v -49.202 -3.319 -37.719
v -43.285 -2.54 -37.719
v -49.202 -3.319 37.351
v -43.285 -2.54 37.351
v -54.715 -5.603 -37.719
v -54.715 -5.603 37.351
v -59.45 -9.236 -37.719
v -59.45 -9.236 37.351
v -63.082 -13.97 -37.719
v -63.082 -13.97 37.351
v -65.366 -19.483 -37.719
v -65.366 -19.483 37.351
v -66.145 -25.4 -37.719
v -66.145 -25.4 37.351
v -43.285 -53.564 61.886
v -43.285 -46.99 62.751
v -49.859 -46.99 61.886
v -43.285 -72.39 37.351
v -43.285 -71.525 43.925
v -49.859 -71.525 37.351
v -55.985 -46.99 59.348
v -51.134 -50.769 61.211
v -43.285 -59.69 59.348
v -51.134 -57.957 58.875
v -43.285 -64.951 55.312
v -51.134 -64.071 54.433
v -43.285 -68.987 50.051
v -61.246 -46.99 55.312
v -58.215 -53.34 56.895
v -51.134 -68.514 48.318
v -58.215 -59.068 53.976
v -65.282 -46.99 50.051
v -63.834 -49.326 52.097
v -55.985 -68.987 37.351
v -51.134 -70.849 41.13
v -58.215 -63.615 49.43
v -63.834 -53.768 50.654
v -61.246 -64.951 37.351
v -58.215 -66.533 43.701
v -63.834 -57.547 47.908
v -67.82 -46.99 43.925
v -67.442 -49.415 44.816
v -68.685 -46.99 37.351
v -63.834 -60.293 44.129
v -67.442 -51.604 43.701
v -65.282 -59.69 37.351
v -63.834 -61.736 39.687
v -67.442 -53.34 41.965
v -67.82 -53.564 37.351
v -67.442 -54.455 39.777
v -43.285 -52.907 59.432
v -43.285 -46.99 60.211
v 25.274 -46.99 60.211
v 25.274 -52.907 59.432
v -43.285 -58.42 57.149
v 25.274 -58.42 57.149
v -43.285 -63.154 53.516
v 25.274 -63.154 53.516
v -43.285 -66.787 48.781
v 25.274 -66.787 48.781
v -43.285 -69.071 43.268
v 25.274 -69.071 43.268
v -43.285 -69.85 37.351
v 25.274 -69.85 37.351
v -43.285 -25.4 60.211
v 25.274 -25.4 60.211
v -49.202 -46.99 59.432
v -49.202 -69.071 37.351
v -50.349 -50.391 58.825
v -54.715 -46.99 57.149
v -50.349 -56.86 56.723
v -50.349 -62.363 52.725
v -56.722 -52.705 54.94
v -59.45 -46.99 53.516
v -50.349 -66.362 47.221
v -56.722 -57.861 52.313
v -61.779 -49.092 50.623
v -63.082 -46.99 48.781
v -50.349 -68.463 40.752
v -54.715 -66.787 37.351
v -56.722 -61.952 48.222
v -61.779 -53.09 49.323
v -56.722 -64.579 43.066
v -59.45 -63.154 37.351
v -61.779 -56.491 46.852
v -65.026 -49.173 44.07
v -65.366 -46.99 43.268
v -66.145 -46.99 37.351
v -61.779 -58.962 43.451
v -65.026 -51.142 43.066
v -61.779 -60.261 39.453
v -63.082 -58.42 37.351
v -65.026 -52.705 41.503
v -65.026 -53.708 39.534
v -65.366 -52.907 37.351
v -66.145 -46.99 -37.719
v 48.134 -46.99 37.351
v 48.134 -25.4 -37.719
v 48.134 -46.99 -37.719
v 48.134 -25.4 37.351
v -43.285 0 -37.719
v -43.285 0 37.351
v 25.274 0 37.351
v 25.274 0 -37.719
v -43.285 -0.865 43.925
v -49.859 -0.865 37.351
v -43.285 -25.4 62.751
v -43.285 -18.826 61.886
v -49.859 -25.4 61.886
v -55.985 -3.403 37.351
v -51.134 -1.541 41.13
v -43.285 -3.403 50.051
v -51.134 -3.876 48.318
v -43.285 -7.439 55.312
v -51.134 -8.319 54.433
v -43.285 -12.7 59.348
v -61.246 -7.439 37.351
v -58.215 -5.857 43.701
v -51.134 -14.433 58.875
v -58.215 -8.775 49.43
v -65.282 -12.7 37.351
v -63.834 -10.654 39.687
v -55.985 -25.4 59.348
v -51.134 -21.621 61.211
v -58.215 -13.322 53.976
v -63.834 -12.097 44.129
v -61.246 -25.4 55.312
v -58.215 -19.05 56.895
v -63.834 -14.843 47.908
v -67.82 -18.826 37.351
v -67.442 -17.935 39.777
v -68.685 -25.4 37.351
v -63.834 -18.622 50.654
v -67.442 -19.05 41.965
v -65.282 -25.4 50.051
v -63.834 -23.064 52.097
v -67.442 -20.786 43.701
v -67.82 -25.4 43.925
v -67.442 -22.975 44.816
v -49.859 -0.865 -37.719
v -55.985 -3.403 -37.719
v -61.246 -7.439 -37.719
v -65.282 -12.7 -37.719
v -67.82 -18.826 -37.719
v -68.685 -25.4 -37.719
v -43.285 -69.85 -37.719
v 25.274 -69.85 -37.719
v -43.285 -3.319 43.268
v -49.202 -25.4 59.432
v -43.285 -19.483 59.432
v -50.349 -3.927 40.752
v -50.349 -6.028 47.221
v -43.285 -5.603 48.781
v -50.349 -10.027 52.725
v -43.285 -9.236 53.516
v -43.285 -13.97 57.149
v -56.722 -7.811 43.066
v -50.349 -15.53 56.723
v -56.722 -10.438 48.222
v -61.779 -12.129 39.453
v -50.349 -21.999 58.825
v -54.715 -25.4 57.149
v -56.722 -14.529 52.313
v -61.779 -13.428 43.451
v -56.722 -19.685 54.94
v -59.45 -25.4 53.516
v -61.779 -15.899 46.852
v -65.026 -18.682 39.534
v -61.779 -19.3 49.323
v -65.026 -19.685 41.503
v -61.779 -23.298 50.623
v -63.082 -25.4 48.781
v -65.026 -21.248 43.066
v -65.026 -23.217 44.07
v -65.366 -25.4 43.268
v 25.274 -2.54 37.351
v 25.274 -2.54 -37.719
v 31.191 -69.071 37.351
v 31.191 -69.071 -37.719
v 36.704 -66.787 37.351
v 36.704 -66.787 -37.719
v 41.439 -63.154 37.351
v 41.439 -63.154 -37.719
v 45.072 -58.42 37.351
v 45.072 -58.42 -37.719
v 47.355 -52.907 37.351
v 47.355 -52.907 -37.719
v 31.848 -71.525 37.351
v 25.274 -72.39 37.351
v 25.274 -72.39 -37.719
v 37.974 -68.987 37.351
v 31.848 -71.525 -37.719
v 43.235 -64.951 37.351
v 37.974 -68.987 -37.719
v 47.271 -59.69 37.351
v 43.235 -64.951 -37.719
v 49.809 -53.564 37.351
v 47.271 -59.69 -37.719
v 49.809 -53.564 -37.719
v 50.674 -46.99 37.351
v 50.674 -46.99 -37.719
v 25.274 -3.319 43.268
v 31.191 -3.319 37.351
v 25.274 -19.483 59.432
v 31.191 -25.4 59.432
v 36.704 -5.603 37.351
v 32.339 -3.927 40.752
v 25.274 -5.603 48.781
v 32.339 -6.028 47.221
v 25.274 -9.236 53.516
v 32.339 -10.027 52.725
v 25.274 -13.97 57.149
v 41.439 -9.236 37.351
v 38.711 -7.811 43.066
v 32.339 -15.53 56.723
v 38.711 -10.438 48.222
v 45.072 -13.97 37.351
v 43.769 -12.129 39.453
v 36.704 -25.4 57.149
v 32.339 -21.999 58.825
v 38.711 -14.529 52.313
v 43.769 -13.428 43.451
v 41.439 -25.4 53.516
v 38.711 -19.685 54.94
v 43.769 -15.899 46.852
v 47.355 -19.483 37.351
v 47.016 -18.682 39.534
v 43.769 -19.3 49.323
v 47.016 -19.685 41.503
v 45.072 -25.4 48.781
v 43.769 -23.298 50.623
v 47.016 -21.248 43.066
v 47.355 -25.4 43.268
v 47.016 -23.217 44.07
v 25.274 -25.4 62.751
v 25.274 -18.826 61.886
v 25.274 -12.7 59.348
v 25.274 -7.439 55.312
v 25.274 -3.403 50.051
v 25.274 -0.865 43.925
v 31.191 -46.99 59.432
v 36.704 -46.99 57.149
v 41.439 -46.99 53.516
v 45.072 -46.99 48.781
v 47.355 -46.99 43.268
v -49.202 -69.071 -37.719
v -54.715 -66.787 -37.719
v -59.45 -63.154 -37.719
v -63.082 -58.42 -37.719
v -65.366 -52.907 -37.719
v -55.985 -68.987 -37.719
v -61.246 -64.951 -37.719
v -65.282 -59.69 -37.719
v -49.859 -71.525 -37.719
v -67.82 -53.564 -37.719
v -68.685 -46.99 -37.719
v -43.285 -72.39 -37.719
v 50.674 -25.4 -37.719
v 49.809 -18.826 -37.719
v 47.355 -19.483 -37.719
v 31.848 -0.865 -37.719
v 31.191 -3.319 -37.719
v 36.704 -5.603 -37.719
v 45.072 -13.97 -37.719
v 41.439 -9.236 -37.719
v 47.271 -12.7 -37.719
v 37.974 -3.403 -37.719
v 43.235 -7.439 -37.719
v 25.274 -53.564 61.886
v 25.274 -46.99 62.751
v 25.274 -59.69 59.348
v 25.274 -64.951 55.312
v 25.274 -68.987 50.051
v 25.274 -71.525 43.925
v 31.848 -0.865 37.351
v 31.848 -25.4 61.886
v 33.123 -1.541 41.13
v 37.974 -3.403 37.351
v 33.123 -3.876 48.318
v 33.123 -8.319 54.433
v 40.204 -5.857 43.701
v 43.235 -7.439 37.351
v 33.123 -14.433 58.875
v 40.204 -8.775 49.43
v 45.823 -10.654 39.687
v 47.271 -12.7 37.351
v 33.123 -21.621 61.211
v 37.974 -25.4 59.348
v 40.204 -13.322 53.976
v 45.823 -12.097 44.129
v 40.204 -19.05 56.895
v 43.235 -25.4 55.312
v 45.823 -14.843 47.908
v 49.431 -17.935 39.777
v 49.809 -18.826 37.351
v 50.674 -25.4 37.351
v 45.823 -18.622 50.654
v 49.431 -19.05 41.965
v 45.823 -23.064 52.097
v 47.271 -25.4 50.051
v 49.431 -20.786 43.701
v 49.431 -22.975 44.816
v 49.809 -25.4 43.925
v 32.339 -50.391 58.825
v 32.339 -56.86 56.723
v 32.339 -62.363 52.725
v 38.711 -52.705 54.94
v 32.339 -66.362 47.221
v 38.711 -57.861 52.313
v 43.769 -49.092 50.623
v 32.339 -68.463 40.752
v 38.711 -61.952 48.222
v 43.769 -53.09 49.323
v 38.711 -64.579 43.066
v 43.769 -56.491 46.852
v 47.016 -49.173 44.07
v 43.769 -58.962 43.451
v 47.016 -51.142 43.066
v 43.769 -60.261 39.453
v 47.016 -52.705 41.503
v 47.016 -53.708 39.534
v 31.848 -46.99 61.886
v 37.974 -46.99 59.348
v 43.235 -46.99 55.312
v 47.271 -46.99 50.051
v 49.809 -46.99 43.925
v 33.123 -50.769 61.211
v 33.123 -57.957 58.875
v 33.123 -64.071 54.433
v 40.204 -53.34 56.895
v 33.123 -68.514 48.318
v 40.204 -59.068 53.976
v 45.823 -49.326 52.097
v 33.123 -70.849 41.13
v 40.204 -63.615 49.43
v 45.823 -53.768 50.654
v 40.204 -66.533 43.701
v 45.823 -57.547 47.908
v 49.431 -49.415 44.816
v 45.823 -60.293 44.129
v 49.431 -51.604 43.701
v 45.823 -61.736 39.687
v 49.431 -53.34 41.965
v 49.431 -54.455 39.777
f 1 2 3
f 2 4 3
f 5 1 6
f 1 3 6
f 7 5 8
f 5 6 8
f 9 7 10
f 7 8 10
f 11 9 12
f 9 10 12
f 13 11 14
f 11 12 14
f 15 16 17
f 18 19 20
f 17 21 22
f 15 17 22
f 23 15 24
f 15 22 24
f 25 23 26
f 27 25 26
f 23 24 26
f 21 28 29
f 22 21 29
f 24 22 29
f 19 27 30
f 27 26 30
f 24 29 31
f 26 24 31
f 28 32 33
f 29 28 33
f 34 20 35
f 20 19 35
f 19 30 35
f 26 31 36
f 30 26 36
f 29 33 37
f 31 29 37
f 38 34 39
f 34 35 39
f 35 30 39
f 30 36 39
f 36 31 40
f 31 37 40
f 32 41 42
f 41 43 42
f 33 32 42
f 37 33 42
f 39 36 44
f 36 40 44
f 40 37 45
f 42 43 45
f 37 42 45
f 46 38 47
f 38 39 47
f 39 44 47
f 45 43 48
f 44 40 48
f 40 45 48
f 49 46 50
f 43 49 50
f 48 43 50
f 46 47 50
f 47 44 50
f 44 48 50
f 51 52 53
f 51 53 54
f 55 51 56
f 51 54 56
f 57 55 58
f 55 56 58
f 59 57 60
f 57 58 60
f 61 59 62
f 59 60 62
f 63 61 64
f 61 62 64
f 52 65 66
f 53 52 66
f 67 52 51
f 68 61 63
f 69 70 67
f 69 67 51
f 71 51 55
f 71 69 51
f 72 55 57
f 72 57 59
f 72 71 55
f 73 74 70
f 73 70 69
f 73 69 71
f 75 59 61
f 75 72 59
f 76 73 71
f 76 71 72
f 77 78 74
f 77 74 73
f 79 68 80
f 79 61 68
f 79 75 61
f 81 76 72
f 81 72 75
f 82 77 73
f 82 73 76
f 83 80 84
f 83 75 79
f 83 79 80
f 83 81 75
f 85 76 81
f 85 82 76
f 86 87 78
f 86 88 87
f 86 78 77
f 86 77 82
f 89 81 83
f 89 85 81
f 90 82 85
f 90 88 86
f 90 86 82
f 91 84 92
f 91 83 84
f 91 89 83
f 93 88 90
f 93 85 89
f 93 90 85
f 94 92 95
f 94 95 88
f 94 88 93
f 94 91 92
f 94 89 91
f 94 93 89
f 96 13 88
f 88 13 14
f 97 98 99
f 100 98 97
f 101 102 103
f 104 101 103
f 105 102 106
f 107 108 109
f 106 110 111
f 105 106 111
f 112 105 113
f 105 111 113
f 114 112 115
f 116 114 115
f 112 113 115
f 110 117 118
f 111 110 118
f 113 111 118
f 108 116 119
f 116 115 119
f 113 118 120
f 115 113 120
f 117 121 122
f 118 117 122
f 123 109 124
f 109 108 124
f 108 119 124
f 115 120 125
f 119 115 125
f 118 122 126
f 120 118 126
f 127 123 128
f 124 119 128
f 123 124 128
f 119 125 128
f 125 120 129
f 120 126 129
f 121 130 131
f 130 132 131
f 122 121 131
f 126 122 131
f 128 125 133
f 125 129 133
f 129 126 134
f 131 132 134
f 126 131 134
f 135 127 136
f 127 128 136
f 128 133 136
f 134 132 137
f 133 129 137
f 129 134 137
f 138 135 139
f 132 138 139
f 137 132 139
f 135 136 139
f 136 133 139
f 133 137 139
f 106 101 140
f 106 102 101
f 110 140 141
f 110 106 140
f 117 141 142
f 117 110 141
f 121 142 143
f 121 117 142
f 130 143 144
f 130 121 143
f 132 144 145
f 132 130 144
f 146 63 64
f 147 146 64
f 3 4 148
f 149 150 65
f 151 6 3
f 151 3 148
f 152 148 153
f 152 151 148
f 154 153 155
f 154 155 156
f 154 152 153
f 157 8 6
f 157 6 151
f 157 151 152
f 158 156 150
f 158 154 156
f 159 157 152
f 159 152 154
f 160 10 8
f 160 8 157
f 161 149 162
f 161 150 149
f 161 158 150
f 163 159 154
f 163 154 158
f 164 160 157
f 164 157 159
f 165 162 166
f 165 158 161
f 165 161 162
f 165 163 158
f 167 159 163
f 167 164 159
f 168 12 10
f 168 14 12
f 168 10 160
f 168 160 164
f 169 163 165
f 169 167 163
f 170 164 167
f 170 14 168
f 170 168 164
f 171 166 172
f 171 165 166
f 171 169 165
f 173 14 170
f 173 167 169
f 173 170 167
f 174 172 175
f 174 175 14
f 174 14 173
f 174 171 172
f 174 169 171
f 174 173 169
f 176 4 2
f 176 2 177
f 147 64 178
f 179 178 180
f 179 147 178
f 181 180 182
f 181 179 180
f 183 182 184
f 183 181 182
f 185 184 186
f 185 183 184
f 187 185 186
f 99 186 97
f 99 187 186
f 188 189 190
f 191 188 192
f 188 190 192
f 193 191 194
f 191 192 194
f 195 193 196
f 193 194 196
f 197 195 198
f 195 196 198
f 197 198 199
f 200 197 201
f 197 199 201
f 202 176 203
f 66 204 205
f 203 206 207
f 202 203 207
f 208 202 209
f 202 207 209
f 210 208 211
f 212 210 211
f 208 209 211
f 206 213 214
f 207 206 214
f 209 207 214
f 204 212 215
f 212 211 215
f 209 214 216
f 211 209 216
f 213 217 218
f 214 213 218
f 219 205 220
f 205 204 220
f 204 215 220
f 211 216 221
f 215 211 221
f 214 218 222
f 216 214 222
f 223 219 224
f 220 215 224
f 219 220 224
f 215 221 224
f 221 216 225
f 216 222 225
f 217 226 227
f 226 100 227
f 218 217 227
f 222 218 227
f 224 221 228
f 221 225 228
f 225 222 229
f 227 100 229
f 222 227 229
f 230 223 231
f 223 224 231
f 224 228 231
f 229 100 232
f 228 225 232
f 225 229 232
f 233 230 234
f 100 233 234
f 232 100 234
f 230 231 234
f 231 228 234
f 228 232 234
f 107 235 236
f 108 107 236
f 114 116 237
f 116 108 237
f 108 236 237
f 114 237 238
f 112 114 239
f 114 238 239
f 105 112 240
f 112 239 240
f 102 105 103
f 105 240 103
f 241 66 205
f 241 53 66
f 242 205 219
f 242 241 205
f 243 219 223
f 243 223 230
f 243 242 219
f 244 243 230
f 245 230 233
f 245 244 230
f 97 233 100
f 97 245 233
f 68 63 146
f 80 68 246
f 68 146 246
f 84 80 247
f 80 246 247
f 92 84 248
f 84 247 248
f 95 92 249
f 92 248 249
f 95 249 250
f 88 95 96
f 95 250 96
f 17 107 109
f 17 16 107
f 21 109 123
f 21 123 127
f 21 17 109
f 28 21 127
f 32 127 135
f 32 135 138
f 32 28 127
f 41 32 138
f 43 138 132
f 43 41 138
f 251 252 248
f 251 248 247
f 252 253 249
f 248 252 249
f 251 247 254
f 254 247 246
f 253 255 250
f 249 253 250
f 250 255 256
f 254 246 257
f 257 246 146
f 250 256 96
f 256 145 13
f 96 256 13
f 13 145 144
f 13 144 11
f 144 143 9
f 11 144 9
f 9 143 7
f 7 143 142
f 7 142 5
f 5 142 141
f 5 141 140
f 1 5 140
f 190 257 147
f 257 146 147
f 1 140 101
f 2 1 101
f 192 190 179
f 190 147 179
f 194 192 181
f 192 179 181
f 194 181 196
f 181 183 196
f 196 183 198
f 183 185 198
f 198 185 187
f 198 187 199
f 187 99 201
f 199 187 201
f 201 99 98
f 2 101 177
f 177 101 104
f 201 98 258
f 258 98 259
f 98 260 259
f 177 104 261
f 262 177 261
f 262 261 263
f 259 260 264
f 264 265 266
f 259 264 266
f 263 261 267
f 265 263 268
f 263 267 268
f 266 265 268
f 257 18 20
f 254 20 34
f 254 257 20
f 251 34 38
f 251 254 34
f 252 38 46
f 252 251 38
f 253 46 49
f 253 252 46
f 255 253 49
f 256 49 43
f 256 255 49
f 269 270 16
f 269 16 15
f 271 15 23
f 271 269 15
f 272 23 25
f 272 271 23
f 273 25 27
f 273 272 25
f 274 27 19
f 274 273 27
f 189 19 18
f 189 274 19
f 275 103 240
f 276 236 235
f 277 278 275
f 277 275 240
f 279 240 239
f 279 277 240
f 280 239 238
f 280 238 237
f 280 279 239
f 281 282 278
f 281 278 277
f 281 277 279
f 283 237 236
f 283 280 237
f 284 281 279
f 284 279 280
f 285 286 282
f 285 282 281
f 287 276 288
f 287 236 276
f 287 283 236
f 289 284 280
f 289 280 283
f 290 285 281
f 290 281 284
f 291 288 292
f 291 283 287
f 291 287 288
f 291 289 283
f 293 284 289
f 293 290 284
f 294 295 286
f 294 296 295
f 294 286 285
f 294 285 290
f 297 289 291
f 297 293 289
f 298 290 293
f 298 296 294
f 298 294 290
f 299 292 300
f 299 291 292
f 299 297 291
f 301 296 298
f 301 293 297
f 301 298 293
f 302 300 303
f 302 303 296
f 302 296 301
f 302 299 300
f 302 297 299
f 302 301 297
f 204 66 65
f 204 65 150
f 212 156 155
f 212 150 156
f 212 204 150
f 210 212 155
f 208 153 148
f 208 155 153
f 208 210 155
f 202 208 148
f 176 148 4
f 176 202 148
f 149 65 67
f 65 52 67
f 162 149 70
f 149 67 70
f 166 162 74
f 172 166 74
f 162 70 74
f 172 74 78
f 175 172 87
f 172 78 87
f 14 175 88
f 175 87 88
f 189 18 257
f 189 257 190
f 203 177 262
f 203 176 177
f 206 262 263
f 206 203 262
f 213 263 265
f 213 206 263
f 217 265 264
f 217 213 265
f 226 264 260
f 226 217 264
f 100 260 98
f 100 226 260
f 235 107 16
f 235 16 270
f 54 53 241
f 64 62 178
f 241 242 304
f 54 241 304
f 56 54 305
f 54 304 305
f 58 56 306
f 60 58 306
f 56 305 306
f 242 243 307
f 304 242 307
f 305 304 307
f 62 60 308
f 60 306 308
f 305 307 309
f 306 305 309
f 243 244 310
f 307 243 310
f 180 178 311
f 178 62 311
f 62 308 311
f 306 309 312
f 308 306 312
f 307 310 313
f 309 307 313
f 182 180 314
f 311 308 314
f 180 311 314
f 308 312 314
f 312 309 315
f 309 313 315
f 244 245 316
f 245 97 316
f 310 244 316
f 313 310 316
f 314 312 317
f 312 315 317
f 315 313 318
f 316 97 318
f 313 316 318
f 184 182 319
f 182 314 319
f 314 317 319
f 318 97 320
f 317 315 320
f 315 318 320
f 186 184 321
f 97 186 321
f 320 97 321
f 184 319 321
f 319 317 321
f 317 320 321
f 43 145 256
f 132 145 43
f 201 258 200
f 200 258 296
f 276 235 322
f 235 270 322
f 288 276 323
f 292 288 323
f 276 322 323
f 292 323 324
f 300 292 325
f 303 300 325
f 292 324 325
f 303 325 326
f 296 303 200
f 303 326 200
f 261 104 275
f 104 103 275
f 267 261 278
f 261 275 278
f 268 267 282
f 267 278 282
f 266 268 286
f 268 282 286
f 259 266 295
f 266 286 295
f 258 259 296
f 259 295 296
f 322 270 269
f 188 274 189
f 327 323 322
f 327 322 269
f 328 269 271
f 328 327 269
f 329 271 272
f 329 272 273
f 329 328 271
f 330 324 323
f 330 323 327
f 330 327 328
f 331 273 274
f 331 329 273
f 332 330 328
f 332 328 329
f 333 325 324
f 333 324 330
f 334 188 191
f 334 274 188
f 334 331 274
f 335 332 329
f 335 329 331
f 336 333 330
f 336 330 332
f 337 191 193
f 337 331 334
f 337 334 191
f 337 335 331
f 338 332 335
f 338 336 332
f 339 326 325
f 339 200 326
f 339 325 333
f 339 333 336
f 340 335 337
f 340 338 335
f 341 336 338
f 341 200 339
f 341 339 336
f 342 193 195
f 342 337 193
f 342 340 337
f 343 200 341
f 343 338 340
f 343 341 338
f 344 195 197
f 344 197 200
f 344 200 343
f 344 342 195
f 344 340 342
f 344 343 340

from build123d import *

# Parameters (mm, degrees)
F0_W     = 119.359527
F0_H     = 100.470527
F1_DEPTH = 72.39
F2_R     = 25.4
F3_R     = 25.4
F4_R     = 25.4
F5_R     = 25.4
F6_T     = -2.54


with BuildPart() as f1:
    # F0 (on Front) → F1 (new body)
    with BuildSketch(Plane.XZ):
        with Locations((-9.005385, 12.515958)):
            Rectangle(F0_W, F0_H)
    extrude(amount=F1_DEPTH)

    # F2
    f2_edges = [f1.edges().sort_by_distance(p)[0] for p in [
        (-9.005385, -72.39, 62.751222),
    ]]
    fillet(f2_edges, radius=F2_R)

    # F3
    f3_edges = [f1.edges().sort_by_distance(p)[0] for p in [
        (-9.005385, 0, 62.751222),
    ]]
    fillet(f3_edges, radius=F3_R)

    # F4
    f4_edges = [f1.edges().sort_by_distance(p)[0] for p in [
        (50.674379, -36.195, 62.751222),
    ]]
    fillet(f4_edges, radius=F4_R)

    # F5
    f5_edges = [f1.edges().sort_by_distance(p)[0] for p in [
        (-68.685148, -36.195, 62.751222),
    ]]
    fillet(f5_edges, radius=F5_R)

    # F6
    f6_openings = [f1.faces().sort_by_distance(p)[0] for p in [
        (-9.005385, -36.195, -37.719305),
    ]]
    offset(amount=F6_T, openings=f6_openings)


solid = f1.part
